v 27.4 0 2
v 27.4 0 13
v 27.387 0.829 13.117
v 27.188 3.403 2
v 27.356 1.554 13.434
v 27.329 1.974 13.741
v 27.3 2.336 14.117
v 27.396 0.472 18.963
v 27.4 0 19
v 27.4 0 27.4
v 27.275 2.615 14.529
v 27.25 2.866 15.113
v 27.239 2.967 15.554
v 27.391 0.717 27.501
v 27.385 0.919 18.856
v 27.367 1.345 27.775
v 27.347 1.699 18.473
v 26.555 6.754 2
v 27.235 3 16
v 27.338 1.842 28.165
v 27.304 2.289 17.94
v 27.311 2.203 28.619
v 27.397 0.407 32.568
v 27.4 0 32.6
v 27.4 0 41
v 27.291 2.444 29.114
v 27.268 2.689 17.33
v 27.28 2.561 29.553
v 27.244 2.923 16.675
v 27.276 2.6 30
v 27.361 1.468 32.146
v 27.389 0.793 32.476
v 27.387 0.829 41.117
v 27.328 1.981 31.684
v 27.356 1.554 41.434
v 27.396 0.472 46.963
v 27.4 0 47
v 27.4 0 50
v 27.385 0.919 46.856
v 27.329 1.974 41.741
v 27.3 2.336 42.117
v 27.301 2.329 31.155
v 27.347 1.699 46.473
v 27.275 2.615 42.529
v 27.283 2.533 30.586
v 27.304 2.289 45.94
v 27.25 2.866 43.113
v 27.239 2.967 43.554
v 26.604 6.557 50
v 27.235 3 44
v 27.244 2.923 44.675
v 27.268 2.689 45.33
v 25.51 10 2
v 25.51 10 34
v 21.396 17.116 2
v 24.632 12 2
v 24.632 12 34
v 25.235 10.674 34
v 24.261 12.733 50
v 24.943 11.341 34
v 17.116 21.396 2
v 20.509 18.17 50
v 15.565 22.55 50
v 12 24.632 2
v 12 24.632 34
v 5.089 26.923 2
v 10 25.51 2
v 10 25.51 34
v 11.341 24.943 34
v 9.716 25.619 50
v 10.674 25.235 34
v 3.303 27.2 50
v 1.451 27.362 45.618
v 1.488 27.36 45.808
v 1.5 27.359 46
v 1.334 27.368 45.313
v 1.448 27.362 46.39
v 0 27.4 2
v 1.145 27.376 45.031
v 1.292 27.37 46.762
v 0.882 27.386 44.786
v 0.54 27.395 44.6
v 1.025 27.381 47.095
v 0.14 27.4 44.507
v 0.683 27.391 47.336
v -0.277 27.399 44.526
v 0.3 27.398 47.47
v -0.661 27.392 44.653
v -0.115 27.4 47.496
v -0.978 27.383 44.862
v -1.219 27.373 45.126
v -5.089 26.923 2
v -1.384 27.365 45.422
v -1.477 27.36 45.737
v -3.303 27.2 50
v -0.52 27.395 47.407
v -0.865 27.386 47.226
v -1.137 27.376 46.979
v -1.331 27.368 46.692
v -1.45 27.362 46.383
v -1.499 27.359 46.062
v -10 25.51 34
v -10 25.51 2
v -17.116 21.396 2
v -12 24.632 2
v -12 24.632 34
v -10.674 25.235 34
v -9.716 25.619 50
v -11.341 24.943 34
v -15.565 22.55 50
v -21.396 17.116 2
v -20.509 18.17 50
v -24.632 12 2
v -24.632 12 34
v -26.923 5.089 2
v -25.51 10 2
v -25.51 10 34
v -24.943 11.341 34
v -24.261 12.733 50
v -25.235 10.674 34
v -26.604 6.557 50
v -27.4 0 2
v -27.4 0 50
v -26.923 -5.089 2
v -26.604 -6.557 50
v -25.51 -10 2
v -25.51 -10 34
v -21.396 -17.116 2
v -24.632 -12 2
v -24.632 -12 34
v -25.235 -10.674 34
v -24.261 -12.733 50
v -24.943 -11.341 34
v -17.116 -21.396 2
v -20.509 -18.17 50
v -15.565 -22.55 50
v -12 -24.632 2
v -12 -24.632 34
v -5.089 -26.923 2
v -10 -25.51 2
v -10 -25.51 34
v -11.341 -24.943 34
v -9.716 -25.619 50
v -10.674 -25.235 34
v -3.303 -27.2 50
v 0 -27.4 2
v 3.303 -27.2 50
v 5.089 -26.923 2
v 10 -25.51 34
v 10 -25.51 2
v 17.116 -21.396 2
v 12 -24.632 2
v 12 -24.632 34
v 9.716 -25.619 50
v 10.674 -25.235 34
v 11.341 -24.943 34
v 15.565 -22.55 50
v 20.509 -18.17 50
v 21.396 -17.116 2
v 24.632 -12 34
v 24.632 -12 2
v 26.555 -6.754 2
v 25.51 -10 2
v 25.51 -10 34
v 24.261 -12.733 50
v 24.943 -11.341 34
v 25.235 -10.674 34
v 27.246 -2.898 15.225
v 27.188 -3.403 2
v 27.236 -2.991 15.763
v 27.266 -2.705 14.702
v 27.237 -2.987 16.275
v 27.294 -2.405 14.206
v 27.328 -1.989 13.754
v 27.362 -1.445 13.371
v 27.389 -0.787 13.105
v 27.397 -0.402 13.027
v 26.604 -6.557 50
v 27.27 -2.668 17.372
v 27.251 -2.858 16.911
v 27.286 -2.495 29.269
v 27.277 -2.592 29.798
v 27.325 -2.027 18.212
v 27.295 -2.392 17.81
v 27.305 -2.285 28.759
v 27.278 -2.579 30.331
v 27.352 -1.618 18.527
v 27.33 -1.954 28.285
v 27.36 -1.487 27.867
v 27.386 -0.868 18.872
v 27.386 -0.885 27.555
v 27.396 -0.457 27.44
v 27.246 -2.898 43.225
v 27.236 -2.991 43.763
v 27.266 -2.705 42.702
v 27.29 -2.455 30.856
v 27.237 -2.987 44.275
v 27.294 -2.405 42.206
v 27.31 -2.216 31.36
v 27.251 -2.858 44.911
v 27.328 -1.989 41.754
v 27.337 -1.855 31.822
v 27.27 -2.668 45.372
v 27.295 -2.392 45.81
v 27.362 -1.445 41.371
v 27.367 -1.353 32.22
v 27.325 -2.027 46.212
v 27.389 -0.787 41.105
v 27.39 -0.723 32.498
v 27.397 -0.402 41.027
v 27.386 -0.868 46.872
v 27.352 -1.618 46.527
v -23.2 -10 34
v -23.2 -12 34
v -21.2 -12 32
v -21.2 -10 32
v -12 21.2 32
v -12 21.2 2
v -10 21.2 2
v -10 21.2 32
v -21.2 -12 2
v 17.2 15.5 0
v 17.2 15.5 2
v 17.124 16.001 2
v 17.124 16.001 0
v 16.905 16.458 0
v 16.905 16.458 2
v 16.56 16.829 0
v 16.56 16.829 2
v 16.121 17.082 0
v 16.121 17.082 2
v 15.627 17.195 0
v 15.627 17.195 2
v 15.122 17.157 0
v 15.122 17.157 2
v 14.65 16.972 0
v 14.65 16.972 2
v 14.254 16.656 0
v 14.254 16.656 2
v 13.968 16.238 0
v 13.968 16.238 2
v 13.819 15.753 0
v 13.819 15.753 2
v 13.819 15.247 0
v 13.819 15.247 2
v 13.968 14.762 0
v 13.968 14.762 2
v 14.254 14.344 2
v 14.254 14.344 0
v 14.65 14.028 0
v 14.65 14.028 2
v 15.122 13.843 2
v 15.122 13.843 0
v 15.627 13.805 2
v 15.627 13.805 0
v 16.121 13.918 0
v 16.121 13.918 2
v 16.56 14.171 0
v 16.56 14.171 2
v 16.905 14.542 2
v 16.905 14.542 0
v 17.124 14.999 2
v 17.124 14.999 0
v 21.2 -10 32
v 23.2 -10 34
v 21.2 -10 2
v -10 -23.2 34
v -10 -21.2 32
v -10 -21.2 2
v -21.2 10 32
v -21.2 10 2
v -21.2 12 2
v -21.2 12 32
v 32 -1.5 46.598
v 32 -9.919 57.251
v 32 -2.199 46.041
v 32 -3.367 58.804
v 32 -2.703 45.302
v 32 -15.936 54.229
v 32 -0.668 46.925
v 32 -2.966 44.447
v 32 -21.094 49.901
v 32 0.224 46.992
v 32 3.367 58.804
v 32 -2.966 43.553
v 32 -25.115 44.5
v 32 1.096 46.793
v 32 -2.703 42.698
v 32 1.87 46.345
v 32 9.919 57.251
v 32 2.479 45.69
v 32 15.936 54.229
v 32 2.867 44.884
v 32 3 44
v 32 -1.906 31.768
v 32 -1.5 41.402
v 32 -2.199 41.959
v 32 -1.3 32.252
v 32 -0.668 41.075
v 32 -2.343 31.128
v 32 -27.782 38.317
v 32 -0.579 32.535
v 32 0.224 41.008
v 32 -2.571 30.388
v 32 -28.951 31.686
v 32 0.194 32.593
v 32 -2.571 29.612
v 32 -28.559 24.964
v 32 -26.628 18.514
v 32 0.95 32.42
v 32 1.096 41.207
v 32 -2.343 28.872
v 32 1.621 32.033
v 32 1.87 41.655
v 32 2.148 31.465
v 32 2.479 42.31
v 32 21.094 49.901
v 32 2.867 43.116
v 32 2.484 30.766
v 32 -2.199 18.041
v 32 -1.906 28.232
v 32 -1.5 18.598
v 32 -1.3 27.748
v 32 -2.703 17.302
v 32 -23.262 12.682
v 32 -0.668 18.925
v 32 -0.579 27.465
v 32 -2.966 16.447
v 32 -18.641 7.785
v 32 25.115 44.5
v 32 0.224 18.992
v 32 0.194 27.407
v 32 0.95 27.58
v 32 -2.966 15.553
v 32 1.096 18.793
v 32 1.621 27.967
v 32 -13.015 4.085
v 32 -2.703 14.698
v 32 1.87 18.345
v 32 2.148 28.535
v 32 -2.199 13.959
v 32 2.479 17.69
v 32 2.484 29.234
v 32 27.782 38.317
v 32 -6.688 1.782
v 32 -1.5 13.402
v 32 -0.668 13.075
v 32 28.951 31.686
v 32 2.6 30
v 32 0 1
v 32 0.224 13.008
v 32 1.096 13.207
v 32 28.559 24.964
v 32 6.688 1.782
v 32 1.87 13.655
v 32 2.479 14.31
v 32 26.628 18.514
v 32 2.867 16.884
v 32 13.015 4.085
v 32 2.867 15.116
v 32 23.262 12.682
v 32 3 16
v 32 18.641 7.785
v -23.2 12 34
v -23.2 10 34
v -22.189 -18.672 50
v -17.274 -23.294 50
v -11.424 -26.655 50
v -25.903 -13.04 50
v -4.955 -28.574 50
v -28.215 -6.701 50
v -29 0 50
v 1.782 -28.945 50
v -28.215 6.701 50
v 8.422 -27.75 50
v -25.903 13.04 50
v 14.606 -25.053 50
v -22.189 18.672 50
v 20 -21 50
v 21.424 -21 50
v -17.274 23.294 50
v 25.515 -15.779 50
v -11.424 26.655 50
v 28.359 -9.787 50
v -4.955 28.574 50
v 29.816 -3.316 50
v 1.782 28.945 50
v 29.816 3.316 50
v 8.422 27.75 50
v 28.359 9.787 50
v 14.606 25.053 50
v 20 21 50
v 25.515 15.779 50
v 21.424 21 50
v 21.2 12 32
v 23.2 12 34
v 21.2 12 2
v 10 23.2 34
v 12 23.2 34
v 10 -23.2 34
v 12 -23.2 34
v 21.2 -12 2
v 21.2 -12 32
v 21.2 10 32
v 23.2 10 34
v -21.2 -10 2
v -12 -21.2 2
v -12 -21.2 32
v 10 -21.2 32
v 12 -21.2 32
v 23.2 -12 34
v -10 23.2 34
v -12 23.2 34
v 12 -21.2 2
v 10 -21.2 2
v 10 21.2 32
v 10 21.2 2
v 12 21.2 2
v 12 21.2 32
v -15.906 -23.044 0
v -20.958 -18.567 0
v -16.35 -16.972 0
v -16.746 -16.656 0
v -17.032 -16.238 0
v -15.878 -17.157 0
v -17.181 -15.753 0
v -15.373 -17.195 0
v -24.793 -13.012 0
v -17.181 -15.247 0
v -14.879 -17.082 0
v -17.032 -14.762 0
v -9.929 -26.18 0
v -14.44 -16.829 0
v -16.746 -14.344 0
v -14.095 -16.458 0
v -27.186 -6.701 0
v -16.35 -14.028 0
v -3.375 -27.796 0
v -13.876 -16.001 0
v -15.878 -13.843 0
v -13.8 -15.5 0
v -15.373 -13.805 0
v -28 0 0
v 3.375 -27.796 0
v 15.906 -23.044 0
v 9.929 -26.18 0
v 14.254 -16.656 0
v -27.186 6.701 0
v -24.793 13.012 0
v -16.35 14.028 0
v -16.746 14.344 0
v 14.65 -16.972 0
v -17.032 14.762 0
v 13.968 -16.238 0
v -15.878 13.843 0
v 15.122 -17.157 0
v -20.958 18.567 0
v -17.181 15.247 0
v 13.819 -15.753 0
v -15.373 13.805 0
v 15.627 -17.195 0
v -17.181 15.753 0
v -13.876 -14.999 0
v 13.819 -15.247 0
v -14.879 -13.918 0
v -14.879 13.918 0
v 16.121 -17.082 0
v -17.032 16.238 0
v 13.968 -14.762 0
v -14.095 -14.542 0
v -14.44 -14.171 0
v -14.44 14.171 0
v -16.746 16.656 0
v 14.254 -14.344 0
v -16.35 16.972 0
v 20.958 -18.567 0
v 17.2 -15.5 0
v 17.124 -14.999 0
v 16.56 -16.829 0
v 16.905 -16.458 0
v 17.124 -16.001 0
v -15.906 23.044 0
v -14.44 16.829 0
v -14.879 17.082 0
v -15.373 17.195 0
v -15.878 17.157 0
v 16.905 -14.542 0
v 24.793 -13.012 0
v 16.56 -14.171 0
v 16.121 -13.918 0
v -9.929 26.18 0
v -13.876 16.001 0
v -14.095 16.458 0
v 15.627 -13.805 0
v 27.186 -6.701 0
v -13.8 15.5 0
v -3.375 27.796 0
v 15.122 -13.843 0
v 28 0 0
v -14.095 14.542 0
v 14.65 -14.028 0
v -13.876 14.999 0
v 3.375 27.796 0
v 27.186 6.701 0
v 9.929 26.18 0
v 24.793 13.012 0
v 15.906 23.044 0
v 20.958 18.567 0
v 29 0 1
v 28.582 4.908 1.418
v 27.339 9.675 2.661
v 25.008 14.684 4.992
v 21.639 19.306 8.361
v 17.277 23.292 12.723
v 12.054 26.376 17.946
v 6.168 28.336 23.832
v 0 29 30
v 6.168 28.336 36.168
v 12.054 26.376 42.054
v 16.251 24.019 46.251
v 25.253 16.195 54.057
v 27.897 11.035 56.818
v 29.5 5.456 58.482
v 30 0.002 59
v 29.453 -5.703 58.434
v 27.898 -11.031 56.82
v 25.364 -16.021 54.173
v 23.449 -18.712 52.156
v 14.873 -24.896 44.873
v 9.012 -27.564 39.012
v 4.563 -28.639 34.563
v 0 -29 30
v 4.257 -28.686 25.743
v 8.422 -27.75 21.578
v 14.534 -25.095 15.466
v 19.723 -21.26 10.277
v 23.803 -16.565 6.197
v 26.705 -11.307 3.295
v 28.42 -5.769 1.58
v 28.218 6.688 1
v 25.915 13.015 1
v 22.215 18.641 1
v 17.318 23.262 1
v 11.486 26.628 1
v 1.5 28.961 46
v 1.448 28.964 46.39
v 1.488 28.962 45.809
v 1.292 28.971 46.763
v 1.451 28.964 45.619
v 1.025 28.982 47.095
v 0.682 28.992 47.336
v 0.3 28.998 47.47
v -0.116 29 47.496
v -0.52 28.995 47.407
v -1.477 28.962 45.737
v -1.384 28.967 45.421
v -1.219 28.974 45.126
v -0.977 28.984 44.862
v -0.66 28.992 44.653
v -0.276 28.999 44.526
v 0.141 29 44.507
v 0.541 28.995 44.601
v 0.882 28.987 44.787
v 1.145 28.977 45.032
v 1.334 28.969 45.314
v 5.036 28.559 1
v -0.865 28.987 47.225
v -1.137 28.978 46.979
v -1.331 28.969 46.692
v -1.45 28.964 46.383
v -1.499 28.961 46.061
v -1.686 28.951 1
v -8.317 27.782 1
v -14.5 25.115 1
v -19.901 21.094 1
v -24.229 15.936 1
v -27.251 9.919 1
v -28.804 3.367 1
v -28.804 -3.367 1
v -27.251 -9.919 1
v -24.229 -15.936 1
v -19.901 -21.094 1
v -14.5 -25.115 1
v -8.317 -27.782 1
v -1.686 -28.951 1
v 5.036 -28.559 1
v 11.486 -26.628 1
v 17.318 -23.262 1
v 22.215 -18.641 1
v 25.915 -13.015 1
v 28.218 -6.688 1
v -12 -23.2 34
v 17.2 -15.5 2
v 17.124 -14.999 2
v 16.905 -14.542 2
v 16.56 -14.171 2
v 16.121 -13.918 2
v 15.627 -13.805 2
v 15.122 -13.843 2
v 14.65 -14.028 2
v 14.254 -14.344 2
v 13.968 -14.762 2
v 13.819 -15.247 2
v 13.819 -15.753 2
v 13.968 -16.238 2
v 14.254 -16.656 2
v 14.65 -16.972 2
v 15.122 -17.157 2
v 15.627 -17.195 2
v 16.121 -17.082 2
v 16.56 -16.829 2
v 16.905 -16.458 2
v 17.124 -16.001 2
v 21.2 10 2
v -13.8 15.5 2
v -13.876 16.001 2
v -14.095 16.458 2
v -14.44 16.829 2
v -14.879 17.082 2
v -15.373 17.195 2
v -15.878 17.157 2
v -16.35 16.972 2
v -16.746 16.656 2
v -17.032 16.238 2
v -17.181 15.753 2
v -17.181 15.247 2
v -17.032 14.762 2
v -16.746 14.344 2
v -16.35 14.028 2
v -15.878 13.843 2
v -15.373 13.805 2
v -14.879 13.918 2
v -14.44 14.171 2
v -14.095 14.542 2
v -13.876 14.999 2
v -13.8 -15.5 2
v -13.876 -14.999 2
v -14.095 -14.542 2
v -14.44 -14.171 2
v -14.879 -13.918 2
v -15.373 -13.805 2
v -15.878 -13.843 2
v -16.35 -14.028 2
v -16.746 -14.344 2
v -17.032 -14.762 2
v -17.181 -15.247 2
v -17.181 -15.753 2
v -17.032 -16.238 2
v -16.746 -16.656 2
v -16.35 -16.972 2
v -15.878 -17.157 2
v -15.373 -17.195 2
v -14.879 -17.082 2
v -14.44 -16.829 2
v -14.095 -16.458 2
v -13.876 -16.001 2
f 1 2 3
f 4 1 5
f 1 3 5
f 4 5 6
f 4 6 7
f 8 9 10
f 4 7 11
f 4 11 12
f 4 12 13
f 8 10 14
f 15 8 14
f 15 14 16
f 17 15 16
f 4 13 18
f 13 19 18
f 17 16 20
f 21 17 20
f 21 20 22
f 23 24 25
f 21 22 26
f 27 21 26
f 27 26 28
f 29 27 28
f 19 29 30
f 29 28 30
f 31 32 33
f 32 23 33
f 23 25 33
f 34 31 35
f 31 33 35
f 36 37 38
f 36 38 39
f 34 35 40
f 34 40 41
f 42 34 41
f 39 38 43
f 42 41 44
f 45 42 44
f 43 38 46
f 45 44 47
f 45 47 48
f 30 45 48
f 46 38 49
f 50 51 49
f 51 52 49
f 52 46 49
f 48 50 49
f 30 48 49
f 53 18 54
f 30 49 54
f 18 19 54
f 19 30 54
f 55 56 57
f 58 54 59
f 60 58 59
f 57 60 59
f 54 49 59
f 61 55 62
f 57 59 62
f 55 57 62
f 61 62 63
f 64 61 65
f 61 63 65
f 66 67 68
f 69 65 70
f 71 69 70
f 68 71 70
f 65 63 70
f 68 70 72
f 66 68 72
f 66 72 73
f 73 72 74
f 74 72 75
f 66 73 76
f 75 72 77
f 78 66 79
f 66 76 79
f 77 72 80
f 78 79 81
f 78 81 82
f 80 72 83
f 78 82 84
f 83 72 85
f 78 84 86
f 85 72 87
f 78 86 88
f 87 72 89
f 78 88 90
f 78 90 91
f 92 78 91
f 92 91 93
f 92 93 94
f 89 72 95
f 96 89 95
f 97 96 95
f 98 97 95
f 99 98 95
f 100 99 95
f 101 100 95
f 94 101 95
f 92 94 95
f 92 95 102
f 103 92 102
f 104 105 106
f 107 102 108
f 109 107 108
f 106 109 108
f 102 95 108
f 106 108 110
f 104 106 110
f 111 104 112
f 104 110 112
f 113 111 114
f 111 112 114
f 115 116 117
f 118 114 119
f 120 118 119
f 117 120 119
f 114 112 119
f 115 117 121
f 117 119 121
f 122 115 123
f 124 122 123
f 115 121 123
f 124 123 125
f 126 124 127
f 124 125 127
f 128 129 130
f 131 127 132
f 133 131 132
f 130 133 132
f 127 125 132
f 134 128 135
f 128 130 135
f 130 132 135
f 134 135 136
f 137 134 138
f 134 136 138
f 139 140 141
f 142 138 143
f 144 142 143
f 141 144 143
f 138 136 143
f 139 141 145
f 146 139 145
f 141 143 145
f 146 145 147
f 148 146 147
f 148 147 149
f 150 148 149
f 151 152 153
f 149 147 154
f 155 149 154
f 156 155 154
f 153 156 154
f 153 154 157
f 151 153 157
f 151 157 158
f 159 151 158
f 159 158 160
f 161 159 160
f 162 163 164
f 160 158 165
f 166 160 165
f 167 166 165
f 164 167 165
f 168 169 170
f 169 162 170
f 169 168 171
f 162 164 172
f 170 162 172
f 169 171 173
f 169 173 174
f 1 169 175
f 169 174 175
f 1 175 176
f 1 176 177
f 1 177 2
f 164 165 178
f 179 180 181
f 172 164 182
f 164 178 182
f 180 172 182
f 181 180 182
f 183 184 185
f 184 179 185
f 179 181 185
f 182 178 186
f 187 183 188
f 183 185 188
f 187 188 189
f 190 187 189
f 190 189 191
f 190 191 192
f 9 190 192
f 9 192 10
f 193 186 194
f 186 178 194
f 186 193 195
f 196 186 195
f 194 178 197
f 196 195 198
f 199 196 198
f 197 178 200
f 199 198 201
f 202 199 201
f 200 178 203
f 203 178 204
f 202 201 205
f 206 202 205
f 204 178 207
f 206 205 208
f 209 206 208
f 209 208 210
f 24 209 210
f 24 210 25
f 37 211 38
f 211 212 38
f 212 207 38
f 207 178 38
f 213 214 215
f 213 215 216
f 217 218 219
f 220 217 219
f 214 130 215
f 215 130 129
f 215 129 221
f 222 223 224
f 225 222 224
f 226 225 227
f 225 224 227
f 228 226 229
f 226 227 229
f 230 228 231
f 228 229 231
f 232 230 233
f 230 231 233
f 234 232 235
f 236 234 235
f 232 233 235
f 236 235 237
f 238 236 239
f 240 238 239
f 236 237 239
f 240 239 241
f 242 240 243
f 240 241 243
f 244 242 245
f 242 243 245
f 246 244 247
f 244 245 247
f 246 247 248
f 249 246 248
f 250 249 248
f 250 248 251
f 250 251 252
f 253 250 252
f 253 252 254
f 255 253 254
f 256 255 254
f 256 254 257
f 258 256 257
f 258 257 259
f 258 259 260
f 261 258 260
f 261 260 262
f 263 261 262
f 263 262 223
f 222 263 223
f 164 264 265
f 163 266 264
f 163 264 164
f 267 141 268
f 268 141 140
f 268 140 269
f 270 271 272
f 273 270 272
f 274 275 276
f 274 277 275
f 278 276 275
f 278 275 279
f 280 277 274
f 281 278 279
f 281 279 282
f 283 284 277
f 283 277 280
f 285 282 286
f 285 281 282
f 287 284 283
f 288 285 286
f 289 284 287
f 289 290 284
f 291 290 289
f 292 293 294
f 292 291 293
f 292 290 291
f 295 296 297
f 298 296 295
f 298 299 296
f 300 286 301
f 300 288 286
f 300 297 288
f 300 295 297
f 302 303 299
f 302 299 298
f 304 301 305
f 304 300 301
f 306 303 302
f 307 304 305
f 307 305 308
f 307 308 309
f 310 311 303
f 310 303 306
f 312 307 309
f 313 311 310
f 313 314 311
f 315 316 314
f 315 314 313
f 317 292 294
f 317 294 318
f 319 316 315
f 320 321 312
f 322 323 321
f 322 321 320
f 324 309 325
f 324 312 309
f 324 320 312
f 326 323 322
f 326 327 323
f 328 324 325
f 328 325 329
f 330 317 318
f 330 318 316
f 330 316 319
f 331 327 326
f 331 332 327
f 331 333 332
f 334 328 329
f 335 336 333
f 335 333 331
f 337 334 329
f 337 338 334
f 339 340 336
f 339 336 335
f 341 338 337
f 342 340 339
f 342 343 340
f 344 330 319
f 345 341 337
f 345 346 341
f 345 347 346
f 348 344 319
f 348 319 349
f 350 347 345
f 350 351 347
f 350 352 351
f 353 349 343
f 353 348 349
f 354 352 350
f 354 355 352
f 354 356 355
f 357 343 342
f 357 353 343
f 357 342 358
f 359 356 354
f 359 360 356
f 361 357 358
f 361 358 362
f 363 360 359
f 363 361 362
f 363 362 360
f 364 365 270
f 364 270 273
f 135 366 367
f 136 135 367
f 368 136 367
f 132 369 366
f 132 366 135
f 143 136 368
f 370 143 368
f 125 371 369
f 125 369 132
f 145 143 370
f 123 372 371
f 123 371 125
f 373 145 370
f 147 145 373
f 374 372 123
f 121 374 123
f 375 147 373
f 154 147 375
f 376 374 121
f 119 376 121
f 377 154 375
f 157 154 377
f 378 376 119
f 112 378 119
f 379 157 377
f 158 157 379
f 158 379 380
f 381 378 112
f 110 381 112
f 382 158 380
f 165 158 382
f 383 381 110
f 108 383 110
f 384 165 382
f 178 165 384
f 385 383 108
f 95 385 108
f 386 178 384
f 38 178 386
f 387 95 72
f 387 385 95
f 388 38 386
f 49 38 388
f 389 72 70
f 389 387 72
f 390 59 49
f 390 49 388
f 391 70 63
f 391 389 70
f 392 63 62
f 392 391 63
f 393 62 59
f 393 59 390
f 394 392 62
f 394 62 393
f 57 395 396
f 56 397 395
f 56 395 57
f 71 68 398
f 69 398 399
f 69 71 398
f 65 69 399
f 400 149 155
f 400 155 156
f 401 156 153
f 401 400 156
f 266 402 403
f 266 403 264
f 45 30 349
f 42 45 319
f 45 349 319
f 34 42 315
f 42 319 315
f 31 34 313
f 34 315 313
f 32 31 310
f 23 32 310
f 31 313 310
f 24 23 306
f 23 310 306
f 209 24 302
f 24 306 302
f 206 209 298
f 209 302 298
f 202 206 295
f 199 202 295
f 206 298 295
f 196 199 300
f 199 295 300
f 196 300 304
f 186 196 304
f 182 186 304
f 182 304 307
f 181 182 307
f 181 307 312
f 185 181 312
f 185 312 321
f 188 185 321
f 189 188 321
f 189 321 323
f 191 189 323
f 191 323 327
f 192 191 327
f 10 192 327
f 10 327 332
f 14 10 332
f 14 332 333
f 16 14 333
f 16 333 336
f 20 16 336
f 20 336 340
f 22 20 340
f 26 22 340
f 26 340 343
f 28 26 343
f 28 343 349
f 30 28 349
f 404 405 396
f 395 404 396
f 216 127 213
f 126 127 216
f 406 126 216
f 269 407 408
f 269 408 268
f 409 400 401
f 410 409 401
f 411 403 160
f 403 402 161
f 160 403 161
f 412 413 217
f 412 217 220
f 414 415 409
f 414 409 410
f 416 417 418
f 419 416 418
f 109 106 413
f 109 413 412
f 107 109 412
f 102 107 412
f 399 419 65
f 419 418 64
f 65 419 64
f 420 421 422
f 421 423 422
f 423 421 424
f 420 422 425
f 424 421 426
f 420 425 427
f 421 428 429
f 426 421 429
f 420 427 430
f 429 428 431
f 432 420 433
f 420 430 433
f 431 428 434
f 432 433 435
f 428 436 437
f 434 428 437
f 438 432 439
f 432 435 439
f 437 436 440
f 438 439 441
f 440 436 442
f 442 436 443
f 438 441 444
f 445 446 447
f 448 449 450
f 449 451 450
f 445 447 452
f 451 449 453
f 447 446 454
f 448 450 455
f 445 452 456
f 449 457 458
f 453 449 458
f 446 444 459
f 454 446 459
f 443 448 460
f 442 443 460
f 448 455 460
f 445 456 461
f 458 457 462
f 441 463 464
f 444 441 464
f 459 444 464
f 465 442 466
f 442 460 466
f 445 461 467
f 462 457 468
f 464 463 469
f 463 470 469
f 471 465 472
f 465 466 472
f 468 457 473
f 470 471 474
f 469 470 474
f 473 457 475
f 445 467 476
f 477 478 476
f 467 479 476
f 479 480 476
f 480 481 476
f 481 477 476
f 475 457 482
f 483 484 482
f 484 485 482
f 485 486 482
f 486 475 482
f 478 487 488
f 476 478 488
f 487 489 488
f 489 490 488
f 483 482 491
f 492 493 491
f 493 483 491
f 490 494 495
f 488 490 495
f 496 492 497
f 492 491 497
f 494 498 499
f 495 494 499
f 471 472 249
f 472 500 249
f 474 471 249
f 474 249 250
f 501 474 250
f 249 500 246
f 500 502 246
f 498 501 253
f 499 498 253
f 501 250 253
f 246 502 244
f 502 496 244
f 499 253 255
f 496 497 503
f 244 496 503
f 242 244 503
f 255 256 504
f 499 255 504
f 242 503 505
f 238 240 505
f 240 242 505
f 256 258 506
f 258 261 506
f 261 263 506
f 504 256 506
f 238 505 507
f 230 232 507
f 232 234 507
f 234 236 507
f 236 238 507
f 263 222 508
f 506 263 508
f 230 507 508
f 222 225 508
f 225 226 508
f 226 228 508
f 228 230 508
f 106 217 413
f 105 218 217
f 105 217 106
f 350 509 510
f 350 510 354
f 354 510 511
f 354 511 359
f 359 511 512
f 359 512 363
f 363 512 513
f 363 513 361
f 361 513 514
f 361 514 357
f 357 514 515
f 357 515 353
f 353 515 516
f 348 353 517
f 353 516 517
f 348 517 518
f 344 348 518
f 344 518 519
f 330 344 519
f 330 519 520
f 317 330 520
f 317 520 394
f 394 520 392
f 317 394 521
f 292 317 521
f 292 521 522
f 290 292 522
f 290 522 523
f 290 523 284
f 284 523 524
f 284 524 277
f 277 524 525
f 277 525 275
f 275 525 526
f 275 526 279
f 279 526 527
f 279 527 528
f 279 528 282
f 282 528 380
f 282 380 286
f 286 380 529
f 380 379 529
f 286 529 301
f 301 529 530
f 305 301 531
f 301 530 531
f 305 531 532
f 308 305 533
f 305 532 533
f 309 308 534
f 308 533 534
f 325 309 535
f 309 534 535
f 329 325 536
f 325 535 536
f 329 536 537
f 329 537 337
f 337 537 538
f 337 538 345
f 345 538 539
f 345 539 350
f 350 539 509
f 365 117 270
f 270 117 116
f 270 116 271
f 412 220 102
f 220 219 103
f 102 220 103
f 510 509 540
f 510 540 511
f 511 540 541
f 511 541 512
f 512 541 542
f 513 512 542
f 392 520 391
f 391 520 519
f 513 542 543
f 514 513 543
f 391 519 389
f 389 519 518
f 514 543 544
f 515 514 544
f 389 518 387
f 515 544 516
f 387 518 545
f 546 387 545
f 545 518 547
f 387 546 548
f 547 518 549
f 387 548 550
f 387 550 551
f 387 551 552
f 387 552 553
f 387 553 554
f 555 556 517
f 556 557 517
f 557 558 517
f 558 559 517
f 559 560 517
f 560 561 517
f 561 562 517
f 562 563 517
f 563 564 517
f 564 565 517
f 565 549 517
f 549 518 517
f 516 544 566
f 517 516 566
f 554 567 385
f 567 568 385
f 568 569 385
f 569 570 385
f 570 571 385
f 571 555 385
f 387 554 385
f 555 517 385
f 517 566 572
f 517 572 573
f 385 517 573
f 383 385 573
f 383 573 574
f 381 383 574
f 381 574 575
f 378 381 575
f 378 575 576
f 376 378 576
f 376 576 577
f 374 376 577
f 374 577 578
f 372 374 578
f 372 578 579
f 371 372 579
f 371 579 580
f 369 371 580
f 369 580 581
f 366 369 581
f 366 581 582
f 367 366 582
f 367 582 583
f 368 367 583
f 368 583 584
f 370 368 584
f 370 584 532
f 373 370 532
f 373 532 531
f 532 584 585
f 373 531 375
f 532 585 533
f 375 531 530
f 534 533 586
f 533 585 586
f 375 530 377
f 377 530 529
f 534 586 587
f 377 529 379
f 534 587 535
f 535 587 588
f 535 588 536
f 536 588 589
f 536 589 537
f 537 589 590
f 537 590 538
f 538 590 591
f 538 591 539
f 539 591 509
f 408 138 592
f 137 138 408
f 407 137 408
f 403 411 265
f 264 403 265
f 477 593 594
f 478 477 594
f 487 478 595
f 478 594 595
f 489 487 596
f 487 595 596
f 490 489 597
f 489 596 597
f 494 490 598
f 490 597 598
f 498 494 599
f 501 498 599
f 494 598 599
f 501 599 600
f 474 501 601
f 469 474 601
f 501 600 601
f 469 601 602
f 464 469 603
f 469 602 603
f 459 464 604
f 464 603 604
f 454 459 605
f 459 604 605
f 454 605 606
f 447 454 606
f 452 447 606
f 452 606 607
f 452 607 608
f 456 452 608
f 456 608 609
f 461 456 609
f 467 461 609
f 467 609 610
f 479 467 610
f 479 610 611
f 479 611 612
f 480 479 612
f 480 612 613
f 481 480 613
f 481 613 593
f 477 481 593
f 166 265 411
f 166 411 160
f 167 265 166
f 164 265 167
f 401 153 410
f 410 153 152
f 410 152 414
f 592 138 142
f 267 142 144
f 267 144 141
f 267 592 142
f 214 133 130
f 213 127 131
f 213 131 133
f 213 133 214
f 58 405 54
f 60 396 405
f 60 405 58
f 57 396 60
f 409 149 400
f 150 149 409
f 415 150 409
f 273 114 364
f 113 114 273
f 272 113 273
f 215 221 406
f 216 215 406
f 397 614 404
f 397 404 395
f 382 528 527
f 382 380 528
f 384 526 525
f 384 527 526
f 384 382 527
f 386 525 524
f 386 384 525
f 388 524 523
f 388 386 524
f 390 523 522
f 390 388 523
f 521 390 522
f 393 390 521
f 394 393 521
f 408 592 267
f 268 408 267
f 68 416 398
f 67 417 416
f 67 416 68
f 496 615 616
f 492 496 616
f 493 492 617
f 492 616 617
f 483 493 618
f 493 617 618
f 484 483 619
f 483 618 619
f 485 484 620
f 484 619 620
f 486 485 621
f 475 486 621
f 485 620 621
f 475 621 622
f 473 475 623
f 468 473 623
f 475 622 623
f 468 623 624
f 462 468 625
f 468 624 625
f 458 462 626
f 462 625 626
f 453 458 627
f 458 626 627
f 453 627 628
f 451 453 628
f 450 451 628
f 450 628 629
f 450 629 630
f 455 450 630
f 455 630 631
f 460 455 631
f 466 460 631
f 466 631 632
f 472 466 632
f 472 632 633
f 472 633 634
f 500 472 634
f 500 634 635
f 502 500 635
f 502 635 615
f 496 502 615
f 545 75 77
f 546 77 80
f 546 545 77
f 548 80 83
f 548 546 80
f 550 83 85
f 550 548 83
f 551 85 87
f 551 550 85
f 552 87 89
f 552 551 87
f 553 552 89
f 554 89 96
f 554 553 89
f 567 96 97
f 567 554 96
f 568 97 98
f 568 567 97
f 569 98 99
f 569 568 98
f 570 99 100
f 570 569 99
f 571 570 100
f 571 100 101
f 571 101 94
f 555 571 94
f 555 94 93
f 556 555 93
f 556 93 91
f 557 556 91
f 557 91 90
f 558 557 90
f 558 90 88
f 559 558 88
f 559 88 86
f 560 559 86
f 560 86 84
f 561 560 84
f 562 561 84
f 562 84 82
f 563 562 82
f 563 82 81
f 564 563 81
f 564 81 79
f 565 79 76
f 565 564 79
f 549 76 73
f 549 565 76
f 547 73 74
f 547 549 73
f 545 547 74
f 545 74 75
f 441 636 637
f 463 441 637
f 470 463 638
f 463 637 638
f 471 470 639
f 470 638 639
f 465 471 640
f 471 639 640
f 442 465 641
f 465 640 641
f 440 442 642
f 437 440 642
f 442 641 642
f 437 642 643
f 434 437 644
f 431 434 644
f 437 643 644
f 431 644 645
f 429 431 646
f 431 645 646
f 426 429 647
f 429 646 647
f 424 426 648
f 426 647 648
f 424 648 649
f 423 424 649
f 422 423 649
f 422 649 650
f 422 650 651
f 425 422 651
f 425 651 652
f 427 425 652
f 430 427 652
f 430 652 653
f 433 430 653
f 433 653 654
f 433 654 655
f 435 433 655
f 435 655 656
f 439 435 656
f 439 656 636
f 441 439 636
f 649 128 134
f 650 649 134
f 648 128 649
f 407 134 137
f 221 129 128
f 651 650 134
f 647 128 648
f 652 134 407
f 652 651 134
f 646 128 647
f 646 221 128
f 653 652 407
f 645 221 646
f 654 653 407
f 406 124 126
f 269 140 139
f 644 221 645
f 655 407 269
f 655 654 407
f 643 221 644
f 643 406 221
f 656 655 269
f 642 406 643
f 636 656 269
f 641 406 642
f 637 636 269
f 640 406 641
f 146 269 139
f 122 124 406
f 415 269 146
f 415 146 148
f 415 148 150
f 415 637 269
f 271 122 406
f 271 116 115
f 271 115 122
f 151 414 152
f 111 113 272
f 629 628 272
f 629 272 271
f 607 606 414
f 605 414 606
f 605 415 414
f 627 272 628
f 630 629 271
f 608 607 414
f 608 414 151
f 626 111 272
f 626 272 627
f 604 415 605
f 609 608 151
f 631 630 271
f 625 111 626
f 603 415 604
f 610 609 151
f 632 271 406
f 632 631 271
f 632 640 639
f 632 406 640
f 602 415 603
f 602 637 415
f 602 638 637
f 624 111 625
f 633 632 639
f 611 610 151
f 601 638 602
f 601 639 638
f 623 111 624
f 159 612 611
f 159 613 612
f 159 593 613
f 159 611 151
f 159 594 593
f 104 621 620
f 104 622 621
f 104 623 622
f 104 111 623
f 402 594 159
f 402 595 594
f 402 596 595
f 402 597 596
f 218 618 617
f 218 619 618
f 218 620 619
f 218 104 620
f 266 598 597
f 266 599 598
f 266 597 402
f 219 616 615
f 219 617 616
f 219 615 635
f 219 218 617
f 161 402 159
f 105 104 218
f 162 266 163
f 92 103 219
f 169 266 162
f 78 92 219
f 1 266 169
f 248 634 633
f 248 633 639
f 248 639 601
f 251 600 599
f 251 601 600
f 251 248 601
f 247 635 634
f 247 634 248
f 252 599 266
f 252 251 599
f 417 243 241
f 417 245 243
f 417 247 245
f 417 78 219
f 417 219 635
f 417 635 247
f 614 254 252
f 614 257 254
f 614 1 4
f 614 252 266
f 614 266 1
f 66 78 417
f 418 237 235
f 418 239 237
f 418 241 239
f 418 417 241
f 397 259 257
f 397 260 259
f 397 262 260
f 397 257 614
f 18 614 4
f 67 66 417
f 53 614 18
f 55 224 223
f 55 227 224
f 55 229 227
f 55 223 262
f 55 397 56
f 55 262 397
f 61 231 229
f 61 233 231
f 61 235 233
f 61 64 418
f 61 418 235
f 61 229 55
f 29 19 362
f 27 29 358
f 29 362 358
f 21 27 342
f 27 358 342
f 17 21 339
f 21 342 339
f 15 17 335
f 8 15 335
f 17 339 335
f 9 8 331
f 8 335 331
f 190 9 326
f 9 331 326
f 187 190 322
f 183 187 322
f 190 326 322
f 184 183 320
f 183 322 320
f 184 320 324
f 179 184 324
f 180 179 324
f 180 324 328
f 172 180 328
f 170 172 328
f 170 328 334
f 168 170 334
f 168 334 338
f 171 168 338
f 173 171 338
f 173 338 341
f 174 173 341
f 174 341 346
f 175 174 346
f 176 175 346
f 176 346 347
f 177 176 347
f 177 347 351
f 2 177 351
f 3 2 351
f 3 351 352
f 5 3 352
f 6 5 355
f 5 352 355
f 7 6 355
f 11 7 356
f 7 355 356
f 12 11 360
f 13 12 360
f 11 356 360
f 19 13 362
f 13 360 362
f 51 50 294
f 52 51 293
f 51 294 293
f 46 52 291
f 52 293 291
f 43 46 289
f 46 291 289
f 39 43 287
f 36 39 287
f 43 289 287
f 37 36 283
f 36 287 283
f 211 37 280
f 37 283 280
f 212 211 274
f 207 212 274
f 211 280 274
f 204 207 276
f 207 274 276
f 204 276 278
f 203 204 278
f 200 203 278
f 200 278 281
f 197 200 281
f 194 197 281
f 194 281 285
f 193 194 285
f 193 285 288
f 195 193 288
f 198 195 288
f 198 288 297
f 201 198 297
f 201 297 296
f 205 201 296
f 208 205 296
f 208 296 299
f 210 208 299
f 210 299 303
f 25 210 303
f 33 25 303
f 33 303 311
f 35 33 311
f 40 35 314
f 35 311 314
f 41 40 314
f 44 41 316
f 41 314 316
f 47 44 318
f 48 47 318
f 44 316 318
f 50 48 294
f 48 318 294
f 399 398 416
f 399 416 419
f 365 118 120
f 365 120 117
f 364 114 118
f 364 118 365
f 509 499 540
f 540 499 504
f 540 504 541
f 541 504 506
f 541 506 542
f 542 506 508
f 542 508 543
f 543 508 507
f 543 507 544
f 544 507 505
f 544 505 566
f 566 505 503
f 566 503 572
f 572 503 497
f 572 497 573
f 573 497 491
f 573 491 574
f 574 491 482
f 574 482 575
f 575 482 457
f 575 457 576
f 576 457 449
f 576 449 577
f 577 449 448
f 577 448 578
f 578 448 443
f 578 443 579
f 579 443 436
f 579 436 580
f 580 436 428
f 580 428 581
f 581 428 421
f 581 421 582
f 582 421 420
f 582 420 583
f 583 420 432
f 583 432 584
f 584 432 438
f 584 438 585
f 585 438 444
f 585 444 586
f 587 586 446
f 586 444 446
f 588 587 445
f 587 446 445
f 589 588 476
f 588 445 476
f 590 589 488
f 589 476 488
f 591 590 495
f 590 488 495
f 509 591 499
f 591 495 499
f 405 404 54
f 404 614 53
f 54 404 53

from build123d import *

# Parameters (mm, degrees)
CYLINDER003_R           = 1.5
CYLINDER003_DEPTH       = 6
CYLINDER003_ROLL_ANGLE  = 90
CYLINDER002_R           = 30
CYLINDER002_DEPTH       = 20
CYLINDER001_R           = 29
CYLINDER001_DEPTH       = 32
CYLINDER001_PITCH_ANGLE = 90
CYLINDER_R              = 29
CYLINDER_DEPTH          = 60
SKETCH_R                = 27.4
POCKET_DEPTH            = 58
SKETCH002_R             = 2.6
SKETCH002_R_2           = 3
POCKET002_DEPTH         = 6
SKETCH001_R             = 1.7
POCKET003_DEPTH         = 5
SKETCH003_W             = 2
SKETCH003_H             = 4.5
SKETCH003_W_2           = 4.5
SKETCH003_H_2           = 2
PAD_DEPTH               = 34
CHAMFER_SIZE            = 2
CHAMFER001_SIZE         = 1


with BuildPart() as cylinder003:
    # Cylinder003 → Cylinder003 (new body)
    with BuildSketch(Plane.XY):
        Circle(CYLINDER003_R)
    extrude(amount=CYLINDER003_DEPTH)


with BuildPart() as cylinder003_1:
    # Cylinder003 roll: moved
    add(cylinder003.part.rotate(Axis((0, 0, 0), (1, 0, 0)), CYLINDER003_ROLL_ANGLE))


with BuildPart() as cylinder003_2:
    # Cylinder003 placement: moved
    add(cylinder003_1.part.moved(Location((0, 30, 46))))


with BuildPart() as cylinder002:
    # Cylinder002 → Cylinder002 (new body)
    with BuildSketch(Plane.XY.offset(50)):
        Circle(CYLINDER002_R)
    extrude(amount=CYLINDER002_DEPTH)


with BuildPart() as cylinder001:
    # Cylinder001 → Cylinder001 (new body)
    with BuildSketch(Plane.XY):
        Circle(CYLINDER001_R)
    extrude(amount=CYLINDER001_DEPTH)


with BuildPart() as cylinder001_1:
    # Cylinder001 pitch: moved
    add(cylinder001.part.rotate(Axis((0, 0, 0), (0, 1, 0)), CYLINDER001_PITCH_ANGLE))


with BuildPart() as cylinder001_2:
    # Cylinder001 placement: moved
    add(cylinder001_1.part.moved(Location((0, 0, 30))))


with BuildPart() as cut:
    # Cylinder → Cylinder (new body)
    with BuildSketch(Plane.XY):
        Circle(CYLINDER_R)
    extrude(amount=CYLINDER_DEPTH)

    # Fusion: union Cylinder001
    add(cylinder001_2.part)

    # Sketch → Pocket (cut)
    with BuildSketch(Plane.XY.offset(60)):
        Circle(SKETCH_R)
    extrude(amount=-POCKET_DEPTH, mode=Mode.SUBTRACT)

    # Sketch002 → Pocket002 (cut)
    with BuildSketch(Plane.YZ.offset(32)):
        with Locations((0, 30)):
            Circle(SKETCH002_R)
        with Locations((0, 44)):
            Circle(SKETCH002_R_2)
        with Locations((0, 16)):
            Circle(SKETCH002_R_2)
    extrude(amount=-POCKET002_DEPTH, mode=Mode.SUBTRACT)

    # Sketch001 → Pocket003 (cut)
    with BuildSketch(Plane.XY.offset(2)):
        with Locations((-15.5, 15.5)):
            Circle(SKETCH001_R)
        with Locations((15.5, 15.5)):
            Circle(SKETCH001_R)
        with Locations((-15.5, -15.5)):
            Circle(SKETCH001_R)
        with Locations((15.5, -15.5)):
            Circle(SKETCH001_R)
    extrude(amount=-POCKET003_DEPTH, mode=Mode.SUBTRACT)

    # Cut: cut Cylinder002
    add(cylinder002.part, mode=Mode.SUBTRACT)


with BuildPart() as cut001:
    # Sketch003 → Pad (new body)
    with BuildSketch(Plane.XY):
        with Locations((-11, 23.45)):
            Rectangle(SKETCH003_W, SKETCH003_H)
        with Locations((11, 23.45)):
            Rectangle(SKETCH003_W, SKETCH003_H)
        with Locations((-11, -23.45)):
            Rectangle(SKETCH003_W, SKETCH003_H)
        with Locations((11, -23.45)):
            Rectangle(SKETCH003_W, SKETCH003_H)
        with Locations((-23.45, 11)):
            Rectangle(SKETCH003_W_2, SKETCH003_H_2)
        with Locations((-23.45, -11)):
            Rectangle(SKETCH003_W_2, SKETCH003_H_2)
        with Locations((23.45, 11)):
            Rectangle(SKETCH003_W_2, SKETCH003_H_2)
        with Locations((23.45, -11)):
            Rectangle(SKETCH003_W_2, SKETCH003_H_2)
    extrude(amount=PAD_DEPTH)

    # Chamfer
    chamfer_edges = [cut001.edges().sort_by_distance(p)[0] for p in [
        (-21.2, -11, 34),
        (-11, -21.2, 34),
        (-21.2, 11, 34),
        (-11, 21.2, 34),
        (11, -21.2, 34),
        (21.2, -11, 34),
        (21.2, 11, 34),
        (11, 21.2, 34),
    ]]
    chamfer(chamfer_edges, length=CHAMFER_SIZE)

    # Fusion001: union Cut
    add(cut.part)

    # Chamfer001
    chamfer001_edges = [cut001.edges().sort_by_distance(p)[0] for p in [
        (-29, 0, 0),
    ]]
    chamfer(chamfer001_edges, length=CHAMFER001_SIZE)

    # Cut001: cut Cylinder003
    add(cylinder003_2.part, mode=Mode.SUBTRACT)


solid = cut001.part
